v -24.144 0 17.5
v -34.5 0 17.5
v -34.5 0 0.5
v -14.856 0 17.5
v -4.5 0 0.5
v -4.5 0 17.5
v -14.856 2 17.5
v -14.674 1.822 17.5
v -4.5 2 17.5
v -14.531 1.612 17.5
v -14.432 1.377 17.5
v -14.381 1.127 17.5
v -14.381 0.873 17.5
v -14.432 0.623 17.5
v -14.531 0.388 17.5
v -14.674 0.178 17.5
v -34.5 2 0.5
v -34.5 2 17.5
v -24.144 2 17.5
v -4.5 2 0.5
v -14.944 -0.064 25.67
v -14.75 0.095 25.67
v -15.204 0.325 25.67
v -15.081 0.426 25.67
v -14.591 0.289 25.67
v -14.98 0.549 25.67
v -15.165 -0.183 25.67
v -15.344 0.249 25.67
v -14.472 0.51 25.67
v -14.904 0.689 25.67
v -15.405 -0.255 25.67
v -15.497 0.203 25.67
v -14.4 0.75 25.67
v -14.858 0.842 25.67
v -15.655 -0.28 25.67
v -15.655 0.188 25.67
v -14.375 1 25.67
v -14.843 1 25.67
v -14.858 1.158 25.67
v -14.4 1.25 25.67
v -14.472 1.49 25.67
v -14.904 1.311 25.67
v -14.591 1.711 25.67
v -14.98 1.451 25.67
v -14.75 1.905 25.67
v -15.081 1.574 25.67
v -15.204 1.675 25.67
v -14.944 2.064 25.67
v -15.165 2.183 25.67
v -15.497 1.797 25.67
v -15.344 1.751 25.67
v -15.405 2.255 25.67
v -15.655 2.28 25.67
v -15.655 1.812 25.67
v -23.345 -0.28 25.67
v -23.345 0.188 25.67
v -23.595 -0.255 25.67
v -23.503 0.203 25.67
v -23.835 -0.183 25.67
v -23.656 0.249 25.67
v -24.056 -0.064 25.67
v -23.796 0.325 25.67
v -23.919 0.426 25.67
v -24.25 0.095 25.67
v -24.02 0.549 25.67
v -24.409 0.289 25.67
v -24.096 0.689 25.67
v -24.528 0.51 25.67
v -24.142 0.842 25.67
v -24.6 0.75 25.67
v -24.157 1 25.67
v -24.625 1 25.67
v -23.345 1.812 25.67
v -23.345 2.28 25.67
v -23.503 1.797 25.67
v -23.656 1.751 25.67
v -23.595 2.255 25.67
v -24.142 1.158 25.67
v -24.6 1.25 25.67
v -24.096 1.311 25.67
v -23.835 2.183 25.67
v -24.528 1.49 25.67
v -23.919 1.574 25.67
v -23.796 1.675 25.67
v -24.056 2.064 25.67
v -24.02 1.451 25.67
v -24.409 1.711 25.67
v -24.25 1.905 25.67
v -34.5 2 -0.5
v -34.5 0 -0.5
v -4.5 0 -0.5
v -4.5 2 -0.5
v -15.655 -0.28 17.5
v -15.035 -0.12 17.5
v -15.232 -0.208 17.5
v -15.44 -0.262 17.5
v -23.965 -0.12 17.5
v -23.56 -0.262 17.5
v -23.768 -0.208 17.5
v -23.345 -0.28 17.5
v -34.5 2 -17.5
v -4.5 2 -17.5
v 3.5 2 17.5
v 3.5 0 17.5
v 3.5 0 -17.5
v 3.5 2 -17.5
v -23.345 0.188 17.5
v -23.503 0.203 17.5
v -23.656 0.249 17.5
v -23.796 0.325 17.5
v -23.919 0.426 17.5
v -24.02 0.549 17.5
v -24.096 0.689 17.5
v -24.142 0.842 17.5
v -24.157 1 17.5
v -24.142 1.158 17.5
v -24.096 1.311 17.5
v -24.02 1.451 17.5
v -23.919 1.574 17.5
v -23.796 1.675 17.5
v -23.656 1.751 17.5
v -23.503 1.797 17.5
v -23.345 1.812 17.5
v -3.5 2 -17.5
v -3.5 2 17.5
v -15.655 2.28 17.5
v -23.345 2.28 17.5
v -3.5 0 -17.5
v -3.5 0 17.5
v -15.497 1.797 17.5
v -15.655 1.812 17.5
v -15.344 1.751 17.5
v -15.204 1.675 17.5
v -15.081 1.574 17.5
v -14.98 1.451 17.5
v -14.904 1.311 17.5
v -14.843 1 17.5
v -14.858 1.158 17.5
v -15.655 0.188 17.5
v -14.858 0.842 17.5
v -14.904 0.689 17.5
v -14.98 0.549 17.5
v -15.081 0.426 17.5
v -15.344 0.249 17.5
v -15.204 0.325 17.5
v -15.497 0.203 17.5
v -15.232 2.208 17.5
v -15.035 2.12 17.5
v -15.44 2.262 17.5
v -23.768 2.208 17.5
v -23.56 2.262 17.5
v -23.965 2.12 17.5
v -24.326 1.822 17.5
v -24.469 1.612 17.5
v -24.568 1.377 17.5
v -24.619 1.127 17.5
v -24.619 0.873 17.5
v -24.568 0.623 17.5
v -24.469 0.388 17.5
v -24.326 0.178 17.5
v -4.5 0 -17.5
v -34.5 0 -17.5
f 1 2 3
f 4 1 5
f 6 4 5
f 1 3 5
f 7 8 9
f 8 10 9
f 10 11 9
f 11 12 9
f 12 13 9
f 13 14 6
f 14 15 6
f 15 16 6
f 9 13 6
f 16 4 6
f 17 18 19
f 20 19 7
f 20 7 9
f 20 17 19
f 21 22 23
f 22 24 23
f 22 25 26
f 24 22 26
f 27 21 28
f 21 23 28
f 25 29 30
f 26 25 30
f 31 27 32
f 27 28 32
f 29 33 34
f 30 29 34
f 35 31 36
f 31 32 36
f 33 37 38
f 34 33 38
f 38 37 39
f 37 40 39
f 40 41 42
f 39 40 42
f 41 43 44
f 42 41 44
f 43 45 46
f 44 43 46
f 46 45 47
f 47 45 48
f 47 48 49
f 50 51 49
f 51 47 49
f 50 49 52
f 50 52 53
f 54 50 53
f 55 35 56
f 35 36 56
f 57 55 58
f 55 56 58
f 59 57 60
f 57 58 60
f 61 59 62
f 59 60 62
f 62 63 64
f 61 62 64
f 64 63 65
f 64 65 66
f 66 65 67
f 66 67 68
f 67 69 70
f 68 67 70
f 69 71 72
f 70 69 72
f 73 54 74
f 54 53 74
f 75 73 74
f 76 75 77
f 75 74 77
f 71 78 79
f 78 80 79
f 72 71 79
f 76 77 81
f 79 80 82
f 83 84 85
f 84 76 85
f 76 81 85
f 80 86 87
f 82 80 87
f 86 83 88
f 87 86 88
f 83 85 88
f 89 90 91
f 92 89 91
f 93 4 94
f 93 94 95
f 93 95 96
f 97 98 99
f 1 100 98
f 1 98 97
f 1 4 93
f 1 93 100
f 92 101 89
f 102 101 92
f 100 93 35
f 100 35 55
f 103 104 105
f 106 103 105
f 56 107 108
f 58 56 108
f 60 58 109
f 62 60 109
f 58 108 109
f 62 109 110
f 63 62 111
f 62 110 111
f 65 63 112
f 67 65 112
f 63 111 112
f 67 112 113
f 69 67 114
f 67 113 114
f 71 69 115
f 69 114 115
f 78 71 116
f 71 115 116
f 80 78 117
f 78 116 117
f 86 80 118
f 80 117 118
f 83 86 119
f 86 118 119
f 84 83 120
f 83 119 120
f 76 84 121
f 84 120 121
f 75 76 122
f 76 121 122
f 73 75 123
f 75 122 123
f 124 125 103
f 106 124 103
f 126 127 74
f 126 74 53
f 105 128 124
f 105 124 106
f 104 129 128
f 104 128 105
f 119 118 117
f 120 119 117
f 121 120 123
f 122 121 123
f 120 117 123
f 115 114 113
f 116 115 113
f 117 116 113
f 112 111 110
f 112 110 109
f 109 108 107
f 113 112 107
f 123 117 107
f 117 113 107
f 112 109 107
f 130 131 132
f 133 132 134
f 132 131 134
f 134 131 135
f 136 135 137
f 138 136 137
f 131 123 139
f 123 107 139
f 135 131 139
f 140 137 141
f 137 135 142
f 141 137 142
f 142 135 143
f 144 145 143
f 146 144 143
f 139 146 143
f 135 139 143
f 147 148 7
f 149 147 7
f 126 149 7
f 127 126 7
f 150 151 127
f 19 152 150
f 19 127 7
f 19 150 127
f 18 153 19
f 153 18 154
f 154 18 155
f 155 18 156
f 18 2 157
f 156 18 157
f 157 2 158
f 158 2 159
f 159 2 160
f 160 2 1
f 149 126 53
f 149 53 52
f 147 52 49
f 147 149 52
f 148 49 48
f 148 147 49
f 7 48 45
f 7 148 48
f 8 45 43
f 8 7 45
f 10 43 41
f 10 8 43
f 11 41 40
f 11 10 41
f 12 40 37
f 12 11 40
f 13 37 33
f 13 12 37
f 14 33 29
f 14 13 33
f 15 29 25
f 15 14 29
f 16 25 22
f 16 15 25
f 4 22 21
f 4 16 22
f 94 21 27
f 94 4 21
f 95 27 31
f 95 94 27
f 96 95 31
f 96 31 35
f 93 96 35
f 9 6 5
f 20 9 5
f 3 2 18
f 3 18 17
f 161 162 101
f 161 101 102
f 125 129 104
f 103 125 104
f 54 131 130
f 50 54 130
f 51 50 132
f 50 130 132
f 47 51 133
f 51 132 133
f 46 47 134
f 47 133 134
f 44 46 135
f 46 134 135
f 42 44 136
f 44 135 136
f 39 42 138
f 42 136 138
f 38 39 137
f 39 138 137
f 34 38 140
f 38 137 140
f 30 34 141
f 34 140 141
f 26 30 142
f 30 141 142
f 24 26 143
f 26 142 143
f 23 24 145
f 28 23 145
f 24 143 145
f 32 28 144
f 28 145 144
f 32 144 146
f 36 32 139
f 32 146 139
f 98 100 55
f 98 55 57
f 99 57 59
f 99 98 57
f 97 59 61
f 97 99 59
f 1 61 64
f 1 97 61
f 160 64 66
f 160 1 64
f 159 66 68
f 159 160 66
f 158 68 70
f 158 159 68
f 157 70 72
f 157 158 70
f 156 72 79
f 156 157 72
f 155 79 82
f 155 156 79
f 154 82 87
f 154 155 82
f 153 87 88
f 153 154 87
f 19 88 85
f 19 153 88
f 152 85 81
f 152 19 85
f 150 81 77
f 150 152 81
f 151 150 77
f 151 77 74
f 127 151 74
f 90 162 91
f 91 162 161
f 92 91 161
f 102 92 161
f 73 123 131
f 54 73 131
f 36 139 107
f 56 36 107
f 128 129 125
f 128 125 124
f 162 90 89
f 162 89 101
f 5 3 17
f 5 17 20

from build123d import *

# Parameters (mm, degrees)
SKETCH1_W               = 7
SKETCH1_H               = 35
CIRCUIT_DEPTH           = 2
SKETCH1_W_2             = 30
SKETCH1_H_2             = 17
CIRCUIT_2_DEPTH         = 2
CIRCUIT_3_DEPTH         = 2
USB_C_PORT_FEMALE_DEPTH = 8.17


with BuildPart() as part:
    # Sketch1 → Circuit (new body)
    with BuildSketch(Plane(origin=(0, 0, 0), x_dir=(1, 0, 0), z_dir=(0, 1, 0))):
        Rectangle(SKETCH1_W, SKETCH1_H)
    extrude(amount=CIRCUIT_DEPTH)


with BuildPart() as body_2:
    # Sketch1 → Circuit 2 (new body)
    with BuildSketch(Plane(origin=(0, 0, 0), x_dir=(1, 0, 0), z_dir=(0, 1, 0))):
        with Locations((-19.5, 9)):
            Rectangle(SKETCH1_W_2, SKETCH1_H_2)
    extrude(amount=CIRCUIT_2_DEPTH)


with BuildPart() as body_3:
    # Sketch1 → Circuit 3 (new body)
    with BuildSketch(Plane(origin=(0, 0, 0), x_dir=(1, 0, 0), z_dir=(0, 1, 0))):
        with Locations((-19.5, -9)):
            Rectangle(SKETCH1_W_2, SKETCH1_H_2)
    extrude(amount=CIRCUIT_3_DEPTH)

    # Sketch2 → USB-C Port Female (add)
    with BuildSketch(Plane.XY.offset(17.5)):
        with BuildLine():
            Line((-23.345, 2.28), (-15.655, 2.28))
            ThreePointArc((-15.655, 2.28), (-14.375, 1), (-15.655, -0.28))
            Line((-15.655, -0.28), (-23.345, -0.28))
            ThreePointArc((-23.345, -0.28), (-24.625, 1), (-23.345, 2.28))
        make_face()
        with BuildLine():
            Line((-23.345, 1.81239), (-15.655, 1.81239))
            ThreePointArc((-15.655, 1.81239), (-14.84261, 1), (-15.655, 0.18761))
            Line((-15.655, 0.18761), (-23.345, 0.18761))
            ThreePointArc((-23.345, 0.18761), (-24.15739, 1), (-23.345, 1.81239))
        make_face(mode=Mode.SUBTRACT)
    extrude(amount=USB_C_PORT_FEMALE_DEPTH)


solid = Compound([part.part, body_2.part, body_3.part])
